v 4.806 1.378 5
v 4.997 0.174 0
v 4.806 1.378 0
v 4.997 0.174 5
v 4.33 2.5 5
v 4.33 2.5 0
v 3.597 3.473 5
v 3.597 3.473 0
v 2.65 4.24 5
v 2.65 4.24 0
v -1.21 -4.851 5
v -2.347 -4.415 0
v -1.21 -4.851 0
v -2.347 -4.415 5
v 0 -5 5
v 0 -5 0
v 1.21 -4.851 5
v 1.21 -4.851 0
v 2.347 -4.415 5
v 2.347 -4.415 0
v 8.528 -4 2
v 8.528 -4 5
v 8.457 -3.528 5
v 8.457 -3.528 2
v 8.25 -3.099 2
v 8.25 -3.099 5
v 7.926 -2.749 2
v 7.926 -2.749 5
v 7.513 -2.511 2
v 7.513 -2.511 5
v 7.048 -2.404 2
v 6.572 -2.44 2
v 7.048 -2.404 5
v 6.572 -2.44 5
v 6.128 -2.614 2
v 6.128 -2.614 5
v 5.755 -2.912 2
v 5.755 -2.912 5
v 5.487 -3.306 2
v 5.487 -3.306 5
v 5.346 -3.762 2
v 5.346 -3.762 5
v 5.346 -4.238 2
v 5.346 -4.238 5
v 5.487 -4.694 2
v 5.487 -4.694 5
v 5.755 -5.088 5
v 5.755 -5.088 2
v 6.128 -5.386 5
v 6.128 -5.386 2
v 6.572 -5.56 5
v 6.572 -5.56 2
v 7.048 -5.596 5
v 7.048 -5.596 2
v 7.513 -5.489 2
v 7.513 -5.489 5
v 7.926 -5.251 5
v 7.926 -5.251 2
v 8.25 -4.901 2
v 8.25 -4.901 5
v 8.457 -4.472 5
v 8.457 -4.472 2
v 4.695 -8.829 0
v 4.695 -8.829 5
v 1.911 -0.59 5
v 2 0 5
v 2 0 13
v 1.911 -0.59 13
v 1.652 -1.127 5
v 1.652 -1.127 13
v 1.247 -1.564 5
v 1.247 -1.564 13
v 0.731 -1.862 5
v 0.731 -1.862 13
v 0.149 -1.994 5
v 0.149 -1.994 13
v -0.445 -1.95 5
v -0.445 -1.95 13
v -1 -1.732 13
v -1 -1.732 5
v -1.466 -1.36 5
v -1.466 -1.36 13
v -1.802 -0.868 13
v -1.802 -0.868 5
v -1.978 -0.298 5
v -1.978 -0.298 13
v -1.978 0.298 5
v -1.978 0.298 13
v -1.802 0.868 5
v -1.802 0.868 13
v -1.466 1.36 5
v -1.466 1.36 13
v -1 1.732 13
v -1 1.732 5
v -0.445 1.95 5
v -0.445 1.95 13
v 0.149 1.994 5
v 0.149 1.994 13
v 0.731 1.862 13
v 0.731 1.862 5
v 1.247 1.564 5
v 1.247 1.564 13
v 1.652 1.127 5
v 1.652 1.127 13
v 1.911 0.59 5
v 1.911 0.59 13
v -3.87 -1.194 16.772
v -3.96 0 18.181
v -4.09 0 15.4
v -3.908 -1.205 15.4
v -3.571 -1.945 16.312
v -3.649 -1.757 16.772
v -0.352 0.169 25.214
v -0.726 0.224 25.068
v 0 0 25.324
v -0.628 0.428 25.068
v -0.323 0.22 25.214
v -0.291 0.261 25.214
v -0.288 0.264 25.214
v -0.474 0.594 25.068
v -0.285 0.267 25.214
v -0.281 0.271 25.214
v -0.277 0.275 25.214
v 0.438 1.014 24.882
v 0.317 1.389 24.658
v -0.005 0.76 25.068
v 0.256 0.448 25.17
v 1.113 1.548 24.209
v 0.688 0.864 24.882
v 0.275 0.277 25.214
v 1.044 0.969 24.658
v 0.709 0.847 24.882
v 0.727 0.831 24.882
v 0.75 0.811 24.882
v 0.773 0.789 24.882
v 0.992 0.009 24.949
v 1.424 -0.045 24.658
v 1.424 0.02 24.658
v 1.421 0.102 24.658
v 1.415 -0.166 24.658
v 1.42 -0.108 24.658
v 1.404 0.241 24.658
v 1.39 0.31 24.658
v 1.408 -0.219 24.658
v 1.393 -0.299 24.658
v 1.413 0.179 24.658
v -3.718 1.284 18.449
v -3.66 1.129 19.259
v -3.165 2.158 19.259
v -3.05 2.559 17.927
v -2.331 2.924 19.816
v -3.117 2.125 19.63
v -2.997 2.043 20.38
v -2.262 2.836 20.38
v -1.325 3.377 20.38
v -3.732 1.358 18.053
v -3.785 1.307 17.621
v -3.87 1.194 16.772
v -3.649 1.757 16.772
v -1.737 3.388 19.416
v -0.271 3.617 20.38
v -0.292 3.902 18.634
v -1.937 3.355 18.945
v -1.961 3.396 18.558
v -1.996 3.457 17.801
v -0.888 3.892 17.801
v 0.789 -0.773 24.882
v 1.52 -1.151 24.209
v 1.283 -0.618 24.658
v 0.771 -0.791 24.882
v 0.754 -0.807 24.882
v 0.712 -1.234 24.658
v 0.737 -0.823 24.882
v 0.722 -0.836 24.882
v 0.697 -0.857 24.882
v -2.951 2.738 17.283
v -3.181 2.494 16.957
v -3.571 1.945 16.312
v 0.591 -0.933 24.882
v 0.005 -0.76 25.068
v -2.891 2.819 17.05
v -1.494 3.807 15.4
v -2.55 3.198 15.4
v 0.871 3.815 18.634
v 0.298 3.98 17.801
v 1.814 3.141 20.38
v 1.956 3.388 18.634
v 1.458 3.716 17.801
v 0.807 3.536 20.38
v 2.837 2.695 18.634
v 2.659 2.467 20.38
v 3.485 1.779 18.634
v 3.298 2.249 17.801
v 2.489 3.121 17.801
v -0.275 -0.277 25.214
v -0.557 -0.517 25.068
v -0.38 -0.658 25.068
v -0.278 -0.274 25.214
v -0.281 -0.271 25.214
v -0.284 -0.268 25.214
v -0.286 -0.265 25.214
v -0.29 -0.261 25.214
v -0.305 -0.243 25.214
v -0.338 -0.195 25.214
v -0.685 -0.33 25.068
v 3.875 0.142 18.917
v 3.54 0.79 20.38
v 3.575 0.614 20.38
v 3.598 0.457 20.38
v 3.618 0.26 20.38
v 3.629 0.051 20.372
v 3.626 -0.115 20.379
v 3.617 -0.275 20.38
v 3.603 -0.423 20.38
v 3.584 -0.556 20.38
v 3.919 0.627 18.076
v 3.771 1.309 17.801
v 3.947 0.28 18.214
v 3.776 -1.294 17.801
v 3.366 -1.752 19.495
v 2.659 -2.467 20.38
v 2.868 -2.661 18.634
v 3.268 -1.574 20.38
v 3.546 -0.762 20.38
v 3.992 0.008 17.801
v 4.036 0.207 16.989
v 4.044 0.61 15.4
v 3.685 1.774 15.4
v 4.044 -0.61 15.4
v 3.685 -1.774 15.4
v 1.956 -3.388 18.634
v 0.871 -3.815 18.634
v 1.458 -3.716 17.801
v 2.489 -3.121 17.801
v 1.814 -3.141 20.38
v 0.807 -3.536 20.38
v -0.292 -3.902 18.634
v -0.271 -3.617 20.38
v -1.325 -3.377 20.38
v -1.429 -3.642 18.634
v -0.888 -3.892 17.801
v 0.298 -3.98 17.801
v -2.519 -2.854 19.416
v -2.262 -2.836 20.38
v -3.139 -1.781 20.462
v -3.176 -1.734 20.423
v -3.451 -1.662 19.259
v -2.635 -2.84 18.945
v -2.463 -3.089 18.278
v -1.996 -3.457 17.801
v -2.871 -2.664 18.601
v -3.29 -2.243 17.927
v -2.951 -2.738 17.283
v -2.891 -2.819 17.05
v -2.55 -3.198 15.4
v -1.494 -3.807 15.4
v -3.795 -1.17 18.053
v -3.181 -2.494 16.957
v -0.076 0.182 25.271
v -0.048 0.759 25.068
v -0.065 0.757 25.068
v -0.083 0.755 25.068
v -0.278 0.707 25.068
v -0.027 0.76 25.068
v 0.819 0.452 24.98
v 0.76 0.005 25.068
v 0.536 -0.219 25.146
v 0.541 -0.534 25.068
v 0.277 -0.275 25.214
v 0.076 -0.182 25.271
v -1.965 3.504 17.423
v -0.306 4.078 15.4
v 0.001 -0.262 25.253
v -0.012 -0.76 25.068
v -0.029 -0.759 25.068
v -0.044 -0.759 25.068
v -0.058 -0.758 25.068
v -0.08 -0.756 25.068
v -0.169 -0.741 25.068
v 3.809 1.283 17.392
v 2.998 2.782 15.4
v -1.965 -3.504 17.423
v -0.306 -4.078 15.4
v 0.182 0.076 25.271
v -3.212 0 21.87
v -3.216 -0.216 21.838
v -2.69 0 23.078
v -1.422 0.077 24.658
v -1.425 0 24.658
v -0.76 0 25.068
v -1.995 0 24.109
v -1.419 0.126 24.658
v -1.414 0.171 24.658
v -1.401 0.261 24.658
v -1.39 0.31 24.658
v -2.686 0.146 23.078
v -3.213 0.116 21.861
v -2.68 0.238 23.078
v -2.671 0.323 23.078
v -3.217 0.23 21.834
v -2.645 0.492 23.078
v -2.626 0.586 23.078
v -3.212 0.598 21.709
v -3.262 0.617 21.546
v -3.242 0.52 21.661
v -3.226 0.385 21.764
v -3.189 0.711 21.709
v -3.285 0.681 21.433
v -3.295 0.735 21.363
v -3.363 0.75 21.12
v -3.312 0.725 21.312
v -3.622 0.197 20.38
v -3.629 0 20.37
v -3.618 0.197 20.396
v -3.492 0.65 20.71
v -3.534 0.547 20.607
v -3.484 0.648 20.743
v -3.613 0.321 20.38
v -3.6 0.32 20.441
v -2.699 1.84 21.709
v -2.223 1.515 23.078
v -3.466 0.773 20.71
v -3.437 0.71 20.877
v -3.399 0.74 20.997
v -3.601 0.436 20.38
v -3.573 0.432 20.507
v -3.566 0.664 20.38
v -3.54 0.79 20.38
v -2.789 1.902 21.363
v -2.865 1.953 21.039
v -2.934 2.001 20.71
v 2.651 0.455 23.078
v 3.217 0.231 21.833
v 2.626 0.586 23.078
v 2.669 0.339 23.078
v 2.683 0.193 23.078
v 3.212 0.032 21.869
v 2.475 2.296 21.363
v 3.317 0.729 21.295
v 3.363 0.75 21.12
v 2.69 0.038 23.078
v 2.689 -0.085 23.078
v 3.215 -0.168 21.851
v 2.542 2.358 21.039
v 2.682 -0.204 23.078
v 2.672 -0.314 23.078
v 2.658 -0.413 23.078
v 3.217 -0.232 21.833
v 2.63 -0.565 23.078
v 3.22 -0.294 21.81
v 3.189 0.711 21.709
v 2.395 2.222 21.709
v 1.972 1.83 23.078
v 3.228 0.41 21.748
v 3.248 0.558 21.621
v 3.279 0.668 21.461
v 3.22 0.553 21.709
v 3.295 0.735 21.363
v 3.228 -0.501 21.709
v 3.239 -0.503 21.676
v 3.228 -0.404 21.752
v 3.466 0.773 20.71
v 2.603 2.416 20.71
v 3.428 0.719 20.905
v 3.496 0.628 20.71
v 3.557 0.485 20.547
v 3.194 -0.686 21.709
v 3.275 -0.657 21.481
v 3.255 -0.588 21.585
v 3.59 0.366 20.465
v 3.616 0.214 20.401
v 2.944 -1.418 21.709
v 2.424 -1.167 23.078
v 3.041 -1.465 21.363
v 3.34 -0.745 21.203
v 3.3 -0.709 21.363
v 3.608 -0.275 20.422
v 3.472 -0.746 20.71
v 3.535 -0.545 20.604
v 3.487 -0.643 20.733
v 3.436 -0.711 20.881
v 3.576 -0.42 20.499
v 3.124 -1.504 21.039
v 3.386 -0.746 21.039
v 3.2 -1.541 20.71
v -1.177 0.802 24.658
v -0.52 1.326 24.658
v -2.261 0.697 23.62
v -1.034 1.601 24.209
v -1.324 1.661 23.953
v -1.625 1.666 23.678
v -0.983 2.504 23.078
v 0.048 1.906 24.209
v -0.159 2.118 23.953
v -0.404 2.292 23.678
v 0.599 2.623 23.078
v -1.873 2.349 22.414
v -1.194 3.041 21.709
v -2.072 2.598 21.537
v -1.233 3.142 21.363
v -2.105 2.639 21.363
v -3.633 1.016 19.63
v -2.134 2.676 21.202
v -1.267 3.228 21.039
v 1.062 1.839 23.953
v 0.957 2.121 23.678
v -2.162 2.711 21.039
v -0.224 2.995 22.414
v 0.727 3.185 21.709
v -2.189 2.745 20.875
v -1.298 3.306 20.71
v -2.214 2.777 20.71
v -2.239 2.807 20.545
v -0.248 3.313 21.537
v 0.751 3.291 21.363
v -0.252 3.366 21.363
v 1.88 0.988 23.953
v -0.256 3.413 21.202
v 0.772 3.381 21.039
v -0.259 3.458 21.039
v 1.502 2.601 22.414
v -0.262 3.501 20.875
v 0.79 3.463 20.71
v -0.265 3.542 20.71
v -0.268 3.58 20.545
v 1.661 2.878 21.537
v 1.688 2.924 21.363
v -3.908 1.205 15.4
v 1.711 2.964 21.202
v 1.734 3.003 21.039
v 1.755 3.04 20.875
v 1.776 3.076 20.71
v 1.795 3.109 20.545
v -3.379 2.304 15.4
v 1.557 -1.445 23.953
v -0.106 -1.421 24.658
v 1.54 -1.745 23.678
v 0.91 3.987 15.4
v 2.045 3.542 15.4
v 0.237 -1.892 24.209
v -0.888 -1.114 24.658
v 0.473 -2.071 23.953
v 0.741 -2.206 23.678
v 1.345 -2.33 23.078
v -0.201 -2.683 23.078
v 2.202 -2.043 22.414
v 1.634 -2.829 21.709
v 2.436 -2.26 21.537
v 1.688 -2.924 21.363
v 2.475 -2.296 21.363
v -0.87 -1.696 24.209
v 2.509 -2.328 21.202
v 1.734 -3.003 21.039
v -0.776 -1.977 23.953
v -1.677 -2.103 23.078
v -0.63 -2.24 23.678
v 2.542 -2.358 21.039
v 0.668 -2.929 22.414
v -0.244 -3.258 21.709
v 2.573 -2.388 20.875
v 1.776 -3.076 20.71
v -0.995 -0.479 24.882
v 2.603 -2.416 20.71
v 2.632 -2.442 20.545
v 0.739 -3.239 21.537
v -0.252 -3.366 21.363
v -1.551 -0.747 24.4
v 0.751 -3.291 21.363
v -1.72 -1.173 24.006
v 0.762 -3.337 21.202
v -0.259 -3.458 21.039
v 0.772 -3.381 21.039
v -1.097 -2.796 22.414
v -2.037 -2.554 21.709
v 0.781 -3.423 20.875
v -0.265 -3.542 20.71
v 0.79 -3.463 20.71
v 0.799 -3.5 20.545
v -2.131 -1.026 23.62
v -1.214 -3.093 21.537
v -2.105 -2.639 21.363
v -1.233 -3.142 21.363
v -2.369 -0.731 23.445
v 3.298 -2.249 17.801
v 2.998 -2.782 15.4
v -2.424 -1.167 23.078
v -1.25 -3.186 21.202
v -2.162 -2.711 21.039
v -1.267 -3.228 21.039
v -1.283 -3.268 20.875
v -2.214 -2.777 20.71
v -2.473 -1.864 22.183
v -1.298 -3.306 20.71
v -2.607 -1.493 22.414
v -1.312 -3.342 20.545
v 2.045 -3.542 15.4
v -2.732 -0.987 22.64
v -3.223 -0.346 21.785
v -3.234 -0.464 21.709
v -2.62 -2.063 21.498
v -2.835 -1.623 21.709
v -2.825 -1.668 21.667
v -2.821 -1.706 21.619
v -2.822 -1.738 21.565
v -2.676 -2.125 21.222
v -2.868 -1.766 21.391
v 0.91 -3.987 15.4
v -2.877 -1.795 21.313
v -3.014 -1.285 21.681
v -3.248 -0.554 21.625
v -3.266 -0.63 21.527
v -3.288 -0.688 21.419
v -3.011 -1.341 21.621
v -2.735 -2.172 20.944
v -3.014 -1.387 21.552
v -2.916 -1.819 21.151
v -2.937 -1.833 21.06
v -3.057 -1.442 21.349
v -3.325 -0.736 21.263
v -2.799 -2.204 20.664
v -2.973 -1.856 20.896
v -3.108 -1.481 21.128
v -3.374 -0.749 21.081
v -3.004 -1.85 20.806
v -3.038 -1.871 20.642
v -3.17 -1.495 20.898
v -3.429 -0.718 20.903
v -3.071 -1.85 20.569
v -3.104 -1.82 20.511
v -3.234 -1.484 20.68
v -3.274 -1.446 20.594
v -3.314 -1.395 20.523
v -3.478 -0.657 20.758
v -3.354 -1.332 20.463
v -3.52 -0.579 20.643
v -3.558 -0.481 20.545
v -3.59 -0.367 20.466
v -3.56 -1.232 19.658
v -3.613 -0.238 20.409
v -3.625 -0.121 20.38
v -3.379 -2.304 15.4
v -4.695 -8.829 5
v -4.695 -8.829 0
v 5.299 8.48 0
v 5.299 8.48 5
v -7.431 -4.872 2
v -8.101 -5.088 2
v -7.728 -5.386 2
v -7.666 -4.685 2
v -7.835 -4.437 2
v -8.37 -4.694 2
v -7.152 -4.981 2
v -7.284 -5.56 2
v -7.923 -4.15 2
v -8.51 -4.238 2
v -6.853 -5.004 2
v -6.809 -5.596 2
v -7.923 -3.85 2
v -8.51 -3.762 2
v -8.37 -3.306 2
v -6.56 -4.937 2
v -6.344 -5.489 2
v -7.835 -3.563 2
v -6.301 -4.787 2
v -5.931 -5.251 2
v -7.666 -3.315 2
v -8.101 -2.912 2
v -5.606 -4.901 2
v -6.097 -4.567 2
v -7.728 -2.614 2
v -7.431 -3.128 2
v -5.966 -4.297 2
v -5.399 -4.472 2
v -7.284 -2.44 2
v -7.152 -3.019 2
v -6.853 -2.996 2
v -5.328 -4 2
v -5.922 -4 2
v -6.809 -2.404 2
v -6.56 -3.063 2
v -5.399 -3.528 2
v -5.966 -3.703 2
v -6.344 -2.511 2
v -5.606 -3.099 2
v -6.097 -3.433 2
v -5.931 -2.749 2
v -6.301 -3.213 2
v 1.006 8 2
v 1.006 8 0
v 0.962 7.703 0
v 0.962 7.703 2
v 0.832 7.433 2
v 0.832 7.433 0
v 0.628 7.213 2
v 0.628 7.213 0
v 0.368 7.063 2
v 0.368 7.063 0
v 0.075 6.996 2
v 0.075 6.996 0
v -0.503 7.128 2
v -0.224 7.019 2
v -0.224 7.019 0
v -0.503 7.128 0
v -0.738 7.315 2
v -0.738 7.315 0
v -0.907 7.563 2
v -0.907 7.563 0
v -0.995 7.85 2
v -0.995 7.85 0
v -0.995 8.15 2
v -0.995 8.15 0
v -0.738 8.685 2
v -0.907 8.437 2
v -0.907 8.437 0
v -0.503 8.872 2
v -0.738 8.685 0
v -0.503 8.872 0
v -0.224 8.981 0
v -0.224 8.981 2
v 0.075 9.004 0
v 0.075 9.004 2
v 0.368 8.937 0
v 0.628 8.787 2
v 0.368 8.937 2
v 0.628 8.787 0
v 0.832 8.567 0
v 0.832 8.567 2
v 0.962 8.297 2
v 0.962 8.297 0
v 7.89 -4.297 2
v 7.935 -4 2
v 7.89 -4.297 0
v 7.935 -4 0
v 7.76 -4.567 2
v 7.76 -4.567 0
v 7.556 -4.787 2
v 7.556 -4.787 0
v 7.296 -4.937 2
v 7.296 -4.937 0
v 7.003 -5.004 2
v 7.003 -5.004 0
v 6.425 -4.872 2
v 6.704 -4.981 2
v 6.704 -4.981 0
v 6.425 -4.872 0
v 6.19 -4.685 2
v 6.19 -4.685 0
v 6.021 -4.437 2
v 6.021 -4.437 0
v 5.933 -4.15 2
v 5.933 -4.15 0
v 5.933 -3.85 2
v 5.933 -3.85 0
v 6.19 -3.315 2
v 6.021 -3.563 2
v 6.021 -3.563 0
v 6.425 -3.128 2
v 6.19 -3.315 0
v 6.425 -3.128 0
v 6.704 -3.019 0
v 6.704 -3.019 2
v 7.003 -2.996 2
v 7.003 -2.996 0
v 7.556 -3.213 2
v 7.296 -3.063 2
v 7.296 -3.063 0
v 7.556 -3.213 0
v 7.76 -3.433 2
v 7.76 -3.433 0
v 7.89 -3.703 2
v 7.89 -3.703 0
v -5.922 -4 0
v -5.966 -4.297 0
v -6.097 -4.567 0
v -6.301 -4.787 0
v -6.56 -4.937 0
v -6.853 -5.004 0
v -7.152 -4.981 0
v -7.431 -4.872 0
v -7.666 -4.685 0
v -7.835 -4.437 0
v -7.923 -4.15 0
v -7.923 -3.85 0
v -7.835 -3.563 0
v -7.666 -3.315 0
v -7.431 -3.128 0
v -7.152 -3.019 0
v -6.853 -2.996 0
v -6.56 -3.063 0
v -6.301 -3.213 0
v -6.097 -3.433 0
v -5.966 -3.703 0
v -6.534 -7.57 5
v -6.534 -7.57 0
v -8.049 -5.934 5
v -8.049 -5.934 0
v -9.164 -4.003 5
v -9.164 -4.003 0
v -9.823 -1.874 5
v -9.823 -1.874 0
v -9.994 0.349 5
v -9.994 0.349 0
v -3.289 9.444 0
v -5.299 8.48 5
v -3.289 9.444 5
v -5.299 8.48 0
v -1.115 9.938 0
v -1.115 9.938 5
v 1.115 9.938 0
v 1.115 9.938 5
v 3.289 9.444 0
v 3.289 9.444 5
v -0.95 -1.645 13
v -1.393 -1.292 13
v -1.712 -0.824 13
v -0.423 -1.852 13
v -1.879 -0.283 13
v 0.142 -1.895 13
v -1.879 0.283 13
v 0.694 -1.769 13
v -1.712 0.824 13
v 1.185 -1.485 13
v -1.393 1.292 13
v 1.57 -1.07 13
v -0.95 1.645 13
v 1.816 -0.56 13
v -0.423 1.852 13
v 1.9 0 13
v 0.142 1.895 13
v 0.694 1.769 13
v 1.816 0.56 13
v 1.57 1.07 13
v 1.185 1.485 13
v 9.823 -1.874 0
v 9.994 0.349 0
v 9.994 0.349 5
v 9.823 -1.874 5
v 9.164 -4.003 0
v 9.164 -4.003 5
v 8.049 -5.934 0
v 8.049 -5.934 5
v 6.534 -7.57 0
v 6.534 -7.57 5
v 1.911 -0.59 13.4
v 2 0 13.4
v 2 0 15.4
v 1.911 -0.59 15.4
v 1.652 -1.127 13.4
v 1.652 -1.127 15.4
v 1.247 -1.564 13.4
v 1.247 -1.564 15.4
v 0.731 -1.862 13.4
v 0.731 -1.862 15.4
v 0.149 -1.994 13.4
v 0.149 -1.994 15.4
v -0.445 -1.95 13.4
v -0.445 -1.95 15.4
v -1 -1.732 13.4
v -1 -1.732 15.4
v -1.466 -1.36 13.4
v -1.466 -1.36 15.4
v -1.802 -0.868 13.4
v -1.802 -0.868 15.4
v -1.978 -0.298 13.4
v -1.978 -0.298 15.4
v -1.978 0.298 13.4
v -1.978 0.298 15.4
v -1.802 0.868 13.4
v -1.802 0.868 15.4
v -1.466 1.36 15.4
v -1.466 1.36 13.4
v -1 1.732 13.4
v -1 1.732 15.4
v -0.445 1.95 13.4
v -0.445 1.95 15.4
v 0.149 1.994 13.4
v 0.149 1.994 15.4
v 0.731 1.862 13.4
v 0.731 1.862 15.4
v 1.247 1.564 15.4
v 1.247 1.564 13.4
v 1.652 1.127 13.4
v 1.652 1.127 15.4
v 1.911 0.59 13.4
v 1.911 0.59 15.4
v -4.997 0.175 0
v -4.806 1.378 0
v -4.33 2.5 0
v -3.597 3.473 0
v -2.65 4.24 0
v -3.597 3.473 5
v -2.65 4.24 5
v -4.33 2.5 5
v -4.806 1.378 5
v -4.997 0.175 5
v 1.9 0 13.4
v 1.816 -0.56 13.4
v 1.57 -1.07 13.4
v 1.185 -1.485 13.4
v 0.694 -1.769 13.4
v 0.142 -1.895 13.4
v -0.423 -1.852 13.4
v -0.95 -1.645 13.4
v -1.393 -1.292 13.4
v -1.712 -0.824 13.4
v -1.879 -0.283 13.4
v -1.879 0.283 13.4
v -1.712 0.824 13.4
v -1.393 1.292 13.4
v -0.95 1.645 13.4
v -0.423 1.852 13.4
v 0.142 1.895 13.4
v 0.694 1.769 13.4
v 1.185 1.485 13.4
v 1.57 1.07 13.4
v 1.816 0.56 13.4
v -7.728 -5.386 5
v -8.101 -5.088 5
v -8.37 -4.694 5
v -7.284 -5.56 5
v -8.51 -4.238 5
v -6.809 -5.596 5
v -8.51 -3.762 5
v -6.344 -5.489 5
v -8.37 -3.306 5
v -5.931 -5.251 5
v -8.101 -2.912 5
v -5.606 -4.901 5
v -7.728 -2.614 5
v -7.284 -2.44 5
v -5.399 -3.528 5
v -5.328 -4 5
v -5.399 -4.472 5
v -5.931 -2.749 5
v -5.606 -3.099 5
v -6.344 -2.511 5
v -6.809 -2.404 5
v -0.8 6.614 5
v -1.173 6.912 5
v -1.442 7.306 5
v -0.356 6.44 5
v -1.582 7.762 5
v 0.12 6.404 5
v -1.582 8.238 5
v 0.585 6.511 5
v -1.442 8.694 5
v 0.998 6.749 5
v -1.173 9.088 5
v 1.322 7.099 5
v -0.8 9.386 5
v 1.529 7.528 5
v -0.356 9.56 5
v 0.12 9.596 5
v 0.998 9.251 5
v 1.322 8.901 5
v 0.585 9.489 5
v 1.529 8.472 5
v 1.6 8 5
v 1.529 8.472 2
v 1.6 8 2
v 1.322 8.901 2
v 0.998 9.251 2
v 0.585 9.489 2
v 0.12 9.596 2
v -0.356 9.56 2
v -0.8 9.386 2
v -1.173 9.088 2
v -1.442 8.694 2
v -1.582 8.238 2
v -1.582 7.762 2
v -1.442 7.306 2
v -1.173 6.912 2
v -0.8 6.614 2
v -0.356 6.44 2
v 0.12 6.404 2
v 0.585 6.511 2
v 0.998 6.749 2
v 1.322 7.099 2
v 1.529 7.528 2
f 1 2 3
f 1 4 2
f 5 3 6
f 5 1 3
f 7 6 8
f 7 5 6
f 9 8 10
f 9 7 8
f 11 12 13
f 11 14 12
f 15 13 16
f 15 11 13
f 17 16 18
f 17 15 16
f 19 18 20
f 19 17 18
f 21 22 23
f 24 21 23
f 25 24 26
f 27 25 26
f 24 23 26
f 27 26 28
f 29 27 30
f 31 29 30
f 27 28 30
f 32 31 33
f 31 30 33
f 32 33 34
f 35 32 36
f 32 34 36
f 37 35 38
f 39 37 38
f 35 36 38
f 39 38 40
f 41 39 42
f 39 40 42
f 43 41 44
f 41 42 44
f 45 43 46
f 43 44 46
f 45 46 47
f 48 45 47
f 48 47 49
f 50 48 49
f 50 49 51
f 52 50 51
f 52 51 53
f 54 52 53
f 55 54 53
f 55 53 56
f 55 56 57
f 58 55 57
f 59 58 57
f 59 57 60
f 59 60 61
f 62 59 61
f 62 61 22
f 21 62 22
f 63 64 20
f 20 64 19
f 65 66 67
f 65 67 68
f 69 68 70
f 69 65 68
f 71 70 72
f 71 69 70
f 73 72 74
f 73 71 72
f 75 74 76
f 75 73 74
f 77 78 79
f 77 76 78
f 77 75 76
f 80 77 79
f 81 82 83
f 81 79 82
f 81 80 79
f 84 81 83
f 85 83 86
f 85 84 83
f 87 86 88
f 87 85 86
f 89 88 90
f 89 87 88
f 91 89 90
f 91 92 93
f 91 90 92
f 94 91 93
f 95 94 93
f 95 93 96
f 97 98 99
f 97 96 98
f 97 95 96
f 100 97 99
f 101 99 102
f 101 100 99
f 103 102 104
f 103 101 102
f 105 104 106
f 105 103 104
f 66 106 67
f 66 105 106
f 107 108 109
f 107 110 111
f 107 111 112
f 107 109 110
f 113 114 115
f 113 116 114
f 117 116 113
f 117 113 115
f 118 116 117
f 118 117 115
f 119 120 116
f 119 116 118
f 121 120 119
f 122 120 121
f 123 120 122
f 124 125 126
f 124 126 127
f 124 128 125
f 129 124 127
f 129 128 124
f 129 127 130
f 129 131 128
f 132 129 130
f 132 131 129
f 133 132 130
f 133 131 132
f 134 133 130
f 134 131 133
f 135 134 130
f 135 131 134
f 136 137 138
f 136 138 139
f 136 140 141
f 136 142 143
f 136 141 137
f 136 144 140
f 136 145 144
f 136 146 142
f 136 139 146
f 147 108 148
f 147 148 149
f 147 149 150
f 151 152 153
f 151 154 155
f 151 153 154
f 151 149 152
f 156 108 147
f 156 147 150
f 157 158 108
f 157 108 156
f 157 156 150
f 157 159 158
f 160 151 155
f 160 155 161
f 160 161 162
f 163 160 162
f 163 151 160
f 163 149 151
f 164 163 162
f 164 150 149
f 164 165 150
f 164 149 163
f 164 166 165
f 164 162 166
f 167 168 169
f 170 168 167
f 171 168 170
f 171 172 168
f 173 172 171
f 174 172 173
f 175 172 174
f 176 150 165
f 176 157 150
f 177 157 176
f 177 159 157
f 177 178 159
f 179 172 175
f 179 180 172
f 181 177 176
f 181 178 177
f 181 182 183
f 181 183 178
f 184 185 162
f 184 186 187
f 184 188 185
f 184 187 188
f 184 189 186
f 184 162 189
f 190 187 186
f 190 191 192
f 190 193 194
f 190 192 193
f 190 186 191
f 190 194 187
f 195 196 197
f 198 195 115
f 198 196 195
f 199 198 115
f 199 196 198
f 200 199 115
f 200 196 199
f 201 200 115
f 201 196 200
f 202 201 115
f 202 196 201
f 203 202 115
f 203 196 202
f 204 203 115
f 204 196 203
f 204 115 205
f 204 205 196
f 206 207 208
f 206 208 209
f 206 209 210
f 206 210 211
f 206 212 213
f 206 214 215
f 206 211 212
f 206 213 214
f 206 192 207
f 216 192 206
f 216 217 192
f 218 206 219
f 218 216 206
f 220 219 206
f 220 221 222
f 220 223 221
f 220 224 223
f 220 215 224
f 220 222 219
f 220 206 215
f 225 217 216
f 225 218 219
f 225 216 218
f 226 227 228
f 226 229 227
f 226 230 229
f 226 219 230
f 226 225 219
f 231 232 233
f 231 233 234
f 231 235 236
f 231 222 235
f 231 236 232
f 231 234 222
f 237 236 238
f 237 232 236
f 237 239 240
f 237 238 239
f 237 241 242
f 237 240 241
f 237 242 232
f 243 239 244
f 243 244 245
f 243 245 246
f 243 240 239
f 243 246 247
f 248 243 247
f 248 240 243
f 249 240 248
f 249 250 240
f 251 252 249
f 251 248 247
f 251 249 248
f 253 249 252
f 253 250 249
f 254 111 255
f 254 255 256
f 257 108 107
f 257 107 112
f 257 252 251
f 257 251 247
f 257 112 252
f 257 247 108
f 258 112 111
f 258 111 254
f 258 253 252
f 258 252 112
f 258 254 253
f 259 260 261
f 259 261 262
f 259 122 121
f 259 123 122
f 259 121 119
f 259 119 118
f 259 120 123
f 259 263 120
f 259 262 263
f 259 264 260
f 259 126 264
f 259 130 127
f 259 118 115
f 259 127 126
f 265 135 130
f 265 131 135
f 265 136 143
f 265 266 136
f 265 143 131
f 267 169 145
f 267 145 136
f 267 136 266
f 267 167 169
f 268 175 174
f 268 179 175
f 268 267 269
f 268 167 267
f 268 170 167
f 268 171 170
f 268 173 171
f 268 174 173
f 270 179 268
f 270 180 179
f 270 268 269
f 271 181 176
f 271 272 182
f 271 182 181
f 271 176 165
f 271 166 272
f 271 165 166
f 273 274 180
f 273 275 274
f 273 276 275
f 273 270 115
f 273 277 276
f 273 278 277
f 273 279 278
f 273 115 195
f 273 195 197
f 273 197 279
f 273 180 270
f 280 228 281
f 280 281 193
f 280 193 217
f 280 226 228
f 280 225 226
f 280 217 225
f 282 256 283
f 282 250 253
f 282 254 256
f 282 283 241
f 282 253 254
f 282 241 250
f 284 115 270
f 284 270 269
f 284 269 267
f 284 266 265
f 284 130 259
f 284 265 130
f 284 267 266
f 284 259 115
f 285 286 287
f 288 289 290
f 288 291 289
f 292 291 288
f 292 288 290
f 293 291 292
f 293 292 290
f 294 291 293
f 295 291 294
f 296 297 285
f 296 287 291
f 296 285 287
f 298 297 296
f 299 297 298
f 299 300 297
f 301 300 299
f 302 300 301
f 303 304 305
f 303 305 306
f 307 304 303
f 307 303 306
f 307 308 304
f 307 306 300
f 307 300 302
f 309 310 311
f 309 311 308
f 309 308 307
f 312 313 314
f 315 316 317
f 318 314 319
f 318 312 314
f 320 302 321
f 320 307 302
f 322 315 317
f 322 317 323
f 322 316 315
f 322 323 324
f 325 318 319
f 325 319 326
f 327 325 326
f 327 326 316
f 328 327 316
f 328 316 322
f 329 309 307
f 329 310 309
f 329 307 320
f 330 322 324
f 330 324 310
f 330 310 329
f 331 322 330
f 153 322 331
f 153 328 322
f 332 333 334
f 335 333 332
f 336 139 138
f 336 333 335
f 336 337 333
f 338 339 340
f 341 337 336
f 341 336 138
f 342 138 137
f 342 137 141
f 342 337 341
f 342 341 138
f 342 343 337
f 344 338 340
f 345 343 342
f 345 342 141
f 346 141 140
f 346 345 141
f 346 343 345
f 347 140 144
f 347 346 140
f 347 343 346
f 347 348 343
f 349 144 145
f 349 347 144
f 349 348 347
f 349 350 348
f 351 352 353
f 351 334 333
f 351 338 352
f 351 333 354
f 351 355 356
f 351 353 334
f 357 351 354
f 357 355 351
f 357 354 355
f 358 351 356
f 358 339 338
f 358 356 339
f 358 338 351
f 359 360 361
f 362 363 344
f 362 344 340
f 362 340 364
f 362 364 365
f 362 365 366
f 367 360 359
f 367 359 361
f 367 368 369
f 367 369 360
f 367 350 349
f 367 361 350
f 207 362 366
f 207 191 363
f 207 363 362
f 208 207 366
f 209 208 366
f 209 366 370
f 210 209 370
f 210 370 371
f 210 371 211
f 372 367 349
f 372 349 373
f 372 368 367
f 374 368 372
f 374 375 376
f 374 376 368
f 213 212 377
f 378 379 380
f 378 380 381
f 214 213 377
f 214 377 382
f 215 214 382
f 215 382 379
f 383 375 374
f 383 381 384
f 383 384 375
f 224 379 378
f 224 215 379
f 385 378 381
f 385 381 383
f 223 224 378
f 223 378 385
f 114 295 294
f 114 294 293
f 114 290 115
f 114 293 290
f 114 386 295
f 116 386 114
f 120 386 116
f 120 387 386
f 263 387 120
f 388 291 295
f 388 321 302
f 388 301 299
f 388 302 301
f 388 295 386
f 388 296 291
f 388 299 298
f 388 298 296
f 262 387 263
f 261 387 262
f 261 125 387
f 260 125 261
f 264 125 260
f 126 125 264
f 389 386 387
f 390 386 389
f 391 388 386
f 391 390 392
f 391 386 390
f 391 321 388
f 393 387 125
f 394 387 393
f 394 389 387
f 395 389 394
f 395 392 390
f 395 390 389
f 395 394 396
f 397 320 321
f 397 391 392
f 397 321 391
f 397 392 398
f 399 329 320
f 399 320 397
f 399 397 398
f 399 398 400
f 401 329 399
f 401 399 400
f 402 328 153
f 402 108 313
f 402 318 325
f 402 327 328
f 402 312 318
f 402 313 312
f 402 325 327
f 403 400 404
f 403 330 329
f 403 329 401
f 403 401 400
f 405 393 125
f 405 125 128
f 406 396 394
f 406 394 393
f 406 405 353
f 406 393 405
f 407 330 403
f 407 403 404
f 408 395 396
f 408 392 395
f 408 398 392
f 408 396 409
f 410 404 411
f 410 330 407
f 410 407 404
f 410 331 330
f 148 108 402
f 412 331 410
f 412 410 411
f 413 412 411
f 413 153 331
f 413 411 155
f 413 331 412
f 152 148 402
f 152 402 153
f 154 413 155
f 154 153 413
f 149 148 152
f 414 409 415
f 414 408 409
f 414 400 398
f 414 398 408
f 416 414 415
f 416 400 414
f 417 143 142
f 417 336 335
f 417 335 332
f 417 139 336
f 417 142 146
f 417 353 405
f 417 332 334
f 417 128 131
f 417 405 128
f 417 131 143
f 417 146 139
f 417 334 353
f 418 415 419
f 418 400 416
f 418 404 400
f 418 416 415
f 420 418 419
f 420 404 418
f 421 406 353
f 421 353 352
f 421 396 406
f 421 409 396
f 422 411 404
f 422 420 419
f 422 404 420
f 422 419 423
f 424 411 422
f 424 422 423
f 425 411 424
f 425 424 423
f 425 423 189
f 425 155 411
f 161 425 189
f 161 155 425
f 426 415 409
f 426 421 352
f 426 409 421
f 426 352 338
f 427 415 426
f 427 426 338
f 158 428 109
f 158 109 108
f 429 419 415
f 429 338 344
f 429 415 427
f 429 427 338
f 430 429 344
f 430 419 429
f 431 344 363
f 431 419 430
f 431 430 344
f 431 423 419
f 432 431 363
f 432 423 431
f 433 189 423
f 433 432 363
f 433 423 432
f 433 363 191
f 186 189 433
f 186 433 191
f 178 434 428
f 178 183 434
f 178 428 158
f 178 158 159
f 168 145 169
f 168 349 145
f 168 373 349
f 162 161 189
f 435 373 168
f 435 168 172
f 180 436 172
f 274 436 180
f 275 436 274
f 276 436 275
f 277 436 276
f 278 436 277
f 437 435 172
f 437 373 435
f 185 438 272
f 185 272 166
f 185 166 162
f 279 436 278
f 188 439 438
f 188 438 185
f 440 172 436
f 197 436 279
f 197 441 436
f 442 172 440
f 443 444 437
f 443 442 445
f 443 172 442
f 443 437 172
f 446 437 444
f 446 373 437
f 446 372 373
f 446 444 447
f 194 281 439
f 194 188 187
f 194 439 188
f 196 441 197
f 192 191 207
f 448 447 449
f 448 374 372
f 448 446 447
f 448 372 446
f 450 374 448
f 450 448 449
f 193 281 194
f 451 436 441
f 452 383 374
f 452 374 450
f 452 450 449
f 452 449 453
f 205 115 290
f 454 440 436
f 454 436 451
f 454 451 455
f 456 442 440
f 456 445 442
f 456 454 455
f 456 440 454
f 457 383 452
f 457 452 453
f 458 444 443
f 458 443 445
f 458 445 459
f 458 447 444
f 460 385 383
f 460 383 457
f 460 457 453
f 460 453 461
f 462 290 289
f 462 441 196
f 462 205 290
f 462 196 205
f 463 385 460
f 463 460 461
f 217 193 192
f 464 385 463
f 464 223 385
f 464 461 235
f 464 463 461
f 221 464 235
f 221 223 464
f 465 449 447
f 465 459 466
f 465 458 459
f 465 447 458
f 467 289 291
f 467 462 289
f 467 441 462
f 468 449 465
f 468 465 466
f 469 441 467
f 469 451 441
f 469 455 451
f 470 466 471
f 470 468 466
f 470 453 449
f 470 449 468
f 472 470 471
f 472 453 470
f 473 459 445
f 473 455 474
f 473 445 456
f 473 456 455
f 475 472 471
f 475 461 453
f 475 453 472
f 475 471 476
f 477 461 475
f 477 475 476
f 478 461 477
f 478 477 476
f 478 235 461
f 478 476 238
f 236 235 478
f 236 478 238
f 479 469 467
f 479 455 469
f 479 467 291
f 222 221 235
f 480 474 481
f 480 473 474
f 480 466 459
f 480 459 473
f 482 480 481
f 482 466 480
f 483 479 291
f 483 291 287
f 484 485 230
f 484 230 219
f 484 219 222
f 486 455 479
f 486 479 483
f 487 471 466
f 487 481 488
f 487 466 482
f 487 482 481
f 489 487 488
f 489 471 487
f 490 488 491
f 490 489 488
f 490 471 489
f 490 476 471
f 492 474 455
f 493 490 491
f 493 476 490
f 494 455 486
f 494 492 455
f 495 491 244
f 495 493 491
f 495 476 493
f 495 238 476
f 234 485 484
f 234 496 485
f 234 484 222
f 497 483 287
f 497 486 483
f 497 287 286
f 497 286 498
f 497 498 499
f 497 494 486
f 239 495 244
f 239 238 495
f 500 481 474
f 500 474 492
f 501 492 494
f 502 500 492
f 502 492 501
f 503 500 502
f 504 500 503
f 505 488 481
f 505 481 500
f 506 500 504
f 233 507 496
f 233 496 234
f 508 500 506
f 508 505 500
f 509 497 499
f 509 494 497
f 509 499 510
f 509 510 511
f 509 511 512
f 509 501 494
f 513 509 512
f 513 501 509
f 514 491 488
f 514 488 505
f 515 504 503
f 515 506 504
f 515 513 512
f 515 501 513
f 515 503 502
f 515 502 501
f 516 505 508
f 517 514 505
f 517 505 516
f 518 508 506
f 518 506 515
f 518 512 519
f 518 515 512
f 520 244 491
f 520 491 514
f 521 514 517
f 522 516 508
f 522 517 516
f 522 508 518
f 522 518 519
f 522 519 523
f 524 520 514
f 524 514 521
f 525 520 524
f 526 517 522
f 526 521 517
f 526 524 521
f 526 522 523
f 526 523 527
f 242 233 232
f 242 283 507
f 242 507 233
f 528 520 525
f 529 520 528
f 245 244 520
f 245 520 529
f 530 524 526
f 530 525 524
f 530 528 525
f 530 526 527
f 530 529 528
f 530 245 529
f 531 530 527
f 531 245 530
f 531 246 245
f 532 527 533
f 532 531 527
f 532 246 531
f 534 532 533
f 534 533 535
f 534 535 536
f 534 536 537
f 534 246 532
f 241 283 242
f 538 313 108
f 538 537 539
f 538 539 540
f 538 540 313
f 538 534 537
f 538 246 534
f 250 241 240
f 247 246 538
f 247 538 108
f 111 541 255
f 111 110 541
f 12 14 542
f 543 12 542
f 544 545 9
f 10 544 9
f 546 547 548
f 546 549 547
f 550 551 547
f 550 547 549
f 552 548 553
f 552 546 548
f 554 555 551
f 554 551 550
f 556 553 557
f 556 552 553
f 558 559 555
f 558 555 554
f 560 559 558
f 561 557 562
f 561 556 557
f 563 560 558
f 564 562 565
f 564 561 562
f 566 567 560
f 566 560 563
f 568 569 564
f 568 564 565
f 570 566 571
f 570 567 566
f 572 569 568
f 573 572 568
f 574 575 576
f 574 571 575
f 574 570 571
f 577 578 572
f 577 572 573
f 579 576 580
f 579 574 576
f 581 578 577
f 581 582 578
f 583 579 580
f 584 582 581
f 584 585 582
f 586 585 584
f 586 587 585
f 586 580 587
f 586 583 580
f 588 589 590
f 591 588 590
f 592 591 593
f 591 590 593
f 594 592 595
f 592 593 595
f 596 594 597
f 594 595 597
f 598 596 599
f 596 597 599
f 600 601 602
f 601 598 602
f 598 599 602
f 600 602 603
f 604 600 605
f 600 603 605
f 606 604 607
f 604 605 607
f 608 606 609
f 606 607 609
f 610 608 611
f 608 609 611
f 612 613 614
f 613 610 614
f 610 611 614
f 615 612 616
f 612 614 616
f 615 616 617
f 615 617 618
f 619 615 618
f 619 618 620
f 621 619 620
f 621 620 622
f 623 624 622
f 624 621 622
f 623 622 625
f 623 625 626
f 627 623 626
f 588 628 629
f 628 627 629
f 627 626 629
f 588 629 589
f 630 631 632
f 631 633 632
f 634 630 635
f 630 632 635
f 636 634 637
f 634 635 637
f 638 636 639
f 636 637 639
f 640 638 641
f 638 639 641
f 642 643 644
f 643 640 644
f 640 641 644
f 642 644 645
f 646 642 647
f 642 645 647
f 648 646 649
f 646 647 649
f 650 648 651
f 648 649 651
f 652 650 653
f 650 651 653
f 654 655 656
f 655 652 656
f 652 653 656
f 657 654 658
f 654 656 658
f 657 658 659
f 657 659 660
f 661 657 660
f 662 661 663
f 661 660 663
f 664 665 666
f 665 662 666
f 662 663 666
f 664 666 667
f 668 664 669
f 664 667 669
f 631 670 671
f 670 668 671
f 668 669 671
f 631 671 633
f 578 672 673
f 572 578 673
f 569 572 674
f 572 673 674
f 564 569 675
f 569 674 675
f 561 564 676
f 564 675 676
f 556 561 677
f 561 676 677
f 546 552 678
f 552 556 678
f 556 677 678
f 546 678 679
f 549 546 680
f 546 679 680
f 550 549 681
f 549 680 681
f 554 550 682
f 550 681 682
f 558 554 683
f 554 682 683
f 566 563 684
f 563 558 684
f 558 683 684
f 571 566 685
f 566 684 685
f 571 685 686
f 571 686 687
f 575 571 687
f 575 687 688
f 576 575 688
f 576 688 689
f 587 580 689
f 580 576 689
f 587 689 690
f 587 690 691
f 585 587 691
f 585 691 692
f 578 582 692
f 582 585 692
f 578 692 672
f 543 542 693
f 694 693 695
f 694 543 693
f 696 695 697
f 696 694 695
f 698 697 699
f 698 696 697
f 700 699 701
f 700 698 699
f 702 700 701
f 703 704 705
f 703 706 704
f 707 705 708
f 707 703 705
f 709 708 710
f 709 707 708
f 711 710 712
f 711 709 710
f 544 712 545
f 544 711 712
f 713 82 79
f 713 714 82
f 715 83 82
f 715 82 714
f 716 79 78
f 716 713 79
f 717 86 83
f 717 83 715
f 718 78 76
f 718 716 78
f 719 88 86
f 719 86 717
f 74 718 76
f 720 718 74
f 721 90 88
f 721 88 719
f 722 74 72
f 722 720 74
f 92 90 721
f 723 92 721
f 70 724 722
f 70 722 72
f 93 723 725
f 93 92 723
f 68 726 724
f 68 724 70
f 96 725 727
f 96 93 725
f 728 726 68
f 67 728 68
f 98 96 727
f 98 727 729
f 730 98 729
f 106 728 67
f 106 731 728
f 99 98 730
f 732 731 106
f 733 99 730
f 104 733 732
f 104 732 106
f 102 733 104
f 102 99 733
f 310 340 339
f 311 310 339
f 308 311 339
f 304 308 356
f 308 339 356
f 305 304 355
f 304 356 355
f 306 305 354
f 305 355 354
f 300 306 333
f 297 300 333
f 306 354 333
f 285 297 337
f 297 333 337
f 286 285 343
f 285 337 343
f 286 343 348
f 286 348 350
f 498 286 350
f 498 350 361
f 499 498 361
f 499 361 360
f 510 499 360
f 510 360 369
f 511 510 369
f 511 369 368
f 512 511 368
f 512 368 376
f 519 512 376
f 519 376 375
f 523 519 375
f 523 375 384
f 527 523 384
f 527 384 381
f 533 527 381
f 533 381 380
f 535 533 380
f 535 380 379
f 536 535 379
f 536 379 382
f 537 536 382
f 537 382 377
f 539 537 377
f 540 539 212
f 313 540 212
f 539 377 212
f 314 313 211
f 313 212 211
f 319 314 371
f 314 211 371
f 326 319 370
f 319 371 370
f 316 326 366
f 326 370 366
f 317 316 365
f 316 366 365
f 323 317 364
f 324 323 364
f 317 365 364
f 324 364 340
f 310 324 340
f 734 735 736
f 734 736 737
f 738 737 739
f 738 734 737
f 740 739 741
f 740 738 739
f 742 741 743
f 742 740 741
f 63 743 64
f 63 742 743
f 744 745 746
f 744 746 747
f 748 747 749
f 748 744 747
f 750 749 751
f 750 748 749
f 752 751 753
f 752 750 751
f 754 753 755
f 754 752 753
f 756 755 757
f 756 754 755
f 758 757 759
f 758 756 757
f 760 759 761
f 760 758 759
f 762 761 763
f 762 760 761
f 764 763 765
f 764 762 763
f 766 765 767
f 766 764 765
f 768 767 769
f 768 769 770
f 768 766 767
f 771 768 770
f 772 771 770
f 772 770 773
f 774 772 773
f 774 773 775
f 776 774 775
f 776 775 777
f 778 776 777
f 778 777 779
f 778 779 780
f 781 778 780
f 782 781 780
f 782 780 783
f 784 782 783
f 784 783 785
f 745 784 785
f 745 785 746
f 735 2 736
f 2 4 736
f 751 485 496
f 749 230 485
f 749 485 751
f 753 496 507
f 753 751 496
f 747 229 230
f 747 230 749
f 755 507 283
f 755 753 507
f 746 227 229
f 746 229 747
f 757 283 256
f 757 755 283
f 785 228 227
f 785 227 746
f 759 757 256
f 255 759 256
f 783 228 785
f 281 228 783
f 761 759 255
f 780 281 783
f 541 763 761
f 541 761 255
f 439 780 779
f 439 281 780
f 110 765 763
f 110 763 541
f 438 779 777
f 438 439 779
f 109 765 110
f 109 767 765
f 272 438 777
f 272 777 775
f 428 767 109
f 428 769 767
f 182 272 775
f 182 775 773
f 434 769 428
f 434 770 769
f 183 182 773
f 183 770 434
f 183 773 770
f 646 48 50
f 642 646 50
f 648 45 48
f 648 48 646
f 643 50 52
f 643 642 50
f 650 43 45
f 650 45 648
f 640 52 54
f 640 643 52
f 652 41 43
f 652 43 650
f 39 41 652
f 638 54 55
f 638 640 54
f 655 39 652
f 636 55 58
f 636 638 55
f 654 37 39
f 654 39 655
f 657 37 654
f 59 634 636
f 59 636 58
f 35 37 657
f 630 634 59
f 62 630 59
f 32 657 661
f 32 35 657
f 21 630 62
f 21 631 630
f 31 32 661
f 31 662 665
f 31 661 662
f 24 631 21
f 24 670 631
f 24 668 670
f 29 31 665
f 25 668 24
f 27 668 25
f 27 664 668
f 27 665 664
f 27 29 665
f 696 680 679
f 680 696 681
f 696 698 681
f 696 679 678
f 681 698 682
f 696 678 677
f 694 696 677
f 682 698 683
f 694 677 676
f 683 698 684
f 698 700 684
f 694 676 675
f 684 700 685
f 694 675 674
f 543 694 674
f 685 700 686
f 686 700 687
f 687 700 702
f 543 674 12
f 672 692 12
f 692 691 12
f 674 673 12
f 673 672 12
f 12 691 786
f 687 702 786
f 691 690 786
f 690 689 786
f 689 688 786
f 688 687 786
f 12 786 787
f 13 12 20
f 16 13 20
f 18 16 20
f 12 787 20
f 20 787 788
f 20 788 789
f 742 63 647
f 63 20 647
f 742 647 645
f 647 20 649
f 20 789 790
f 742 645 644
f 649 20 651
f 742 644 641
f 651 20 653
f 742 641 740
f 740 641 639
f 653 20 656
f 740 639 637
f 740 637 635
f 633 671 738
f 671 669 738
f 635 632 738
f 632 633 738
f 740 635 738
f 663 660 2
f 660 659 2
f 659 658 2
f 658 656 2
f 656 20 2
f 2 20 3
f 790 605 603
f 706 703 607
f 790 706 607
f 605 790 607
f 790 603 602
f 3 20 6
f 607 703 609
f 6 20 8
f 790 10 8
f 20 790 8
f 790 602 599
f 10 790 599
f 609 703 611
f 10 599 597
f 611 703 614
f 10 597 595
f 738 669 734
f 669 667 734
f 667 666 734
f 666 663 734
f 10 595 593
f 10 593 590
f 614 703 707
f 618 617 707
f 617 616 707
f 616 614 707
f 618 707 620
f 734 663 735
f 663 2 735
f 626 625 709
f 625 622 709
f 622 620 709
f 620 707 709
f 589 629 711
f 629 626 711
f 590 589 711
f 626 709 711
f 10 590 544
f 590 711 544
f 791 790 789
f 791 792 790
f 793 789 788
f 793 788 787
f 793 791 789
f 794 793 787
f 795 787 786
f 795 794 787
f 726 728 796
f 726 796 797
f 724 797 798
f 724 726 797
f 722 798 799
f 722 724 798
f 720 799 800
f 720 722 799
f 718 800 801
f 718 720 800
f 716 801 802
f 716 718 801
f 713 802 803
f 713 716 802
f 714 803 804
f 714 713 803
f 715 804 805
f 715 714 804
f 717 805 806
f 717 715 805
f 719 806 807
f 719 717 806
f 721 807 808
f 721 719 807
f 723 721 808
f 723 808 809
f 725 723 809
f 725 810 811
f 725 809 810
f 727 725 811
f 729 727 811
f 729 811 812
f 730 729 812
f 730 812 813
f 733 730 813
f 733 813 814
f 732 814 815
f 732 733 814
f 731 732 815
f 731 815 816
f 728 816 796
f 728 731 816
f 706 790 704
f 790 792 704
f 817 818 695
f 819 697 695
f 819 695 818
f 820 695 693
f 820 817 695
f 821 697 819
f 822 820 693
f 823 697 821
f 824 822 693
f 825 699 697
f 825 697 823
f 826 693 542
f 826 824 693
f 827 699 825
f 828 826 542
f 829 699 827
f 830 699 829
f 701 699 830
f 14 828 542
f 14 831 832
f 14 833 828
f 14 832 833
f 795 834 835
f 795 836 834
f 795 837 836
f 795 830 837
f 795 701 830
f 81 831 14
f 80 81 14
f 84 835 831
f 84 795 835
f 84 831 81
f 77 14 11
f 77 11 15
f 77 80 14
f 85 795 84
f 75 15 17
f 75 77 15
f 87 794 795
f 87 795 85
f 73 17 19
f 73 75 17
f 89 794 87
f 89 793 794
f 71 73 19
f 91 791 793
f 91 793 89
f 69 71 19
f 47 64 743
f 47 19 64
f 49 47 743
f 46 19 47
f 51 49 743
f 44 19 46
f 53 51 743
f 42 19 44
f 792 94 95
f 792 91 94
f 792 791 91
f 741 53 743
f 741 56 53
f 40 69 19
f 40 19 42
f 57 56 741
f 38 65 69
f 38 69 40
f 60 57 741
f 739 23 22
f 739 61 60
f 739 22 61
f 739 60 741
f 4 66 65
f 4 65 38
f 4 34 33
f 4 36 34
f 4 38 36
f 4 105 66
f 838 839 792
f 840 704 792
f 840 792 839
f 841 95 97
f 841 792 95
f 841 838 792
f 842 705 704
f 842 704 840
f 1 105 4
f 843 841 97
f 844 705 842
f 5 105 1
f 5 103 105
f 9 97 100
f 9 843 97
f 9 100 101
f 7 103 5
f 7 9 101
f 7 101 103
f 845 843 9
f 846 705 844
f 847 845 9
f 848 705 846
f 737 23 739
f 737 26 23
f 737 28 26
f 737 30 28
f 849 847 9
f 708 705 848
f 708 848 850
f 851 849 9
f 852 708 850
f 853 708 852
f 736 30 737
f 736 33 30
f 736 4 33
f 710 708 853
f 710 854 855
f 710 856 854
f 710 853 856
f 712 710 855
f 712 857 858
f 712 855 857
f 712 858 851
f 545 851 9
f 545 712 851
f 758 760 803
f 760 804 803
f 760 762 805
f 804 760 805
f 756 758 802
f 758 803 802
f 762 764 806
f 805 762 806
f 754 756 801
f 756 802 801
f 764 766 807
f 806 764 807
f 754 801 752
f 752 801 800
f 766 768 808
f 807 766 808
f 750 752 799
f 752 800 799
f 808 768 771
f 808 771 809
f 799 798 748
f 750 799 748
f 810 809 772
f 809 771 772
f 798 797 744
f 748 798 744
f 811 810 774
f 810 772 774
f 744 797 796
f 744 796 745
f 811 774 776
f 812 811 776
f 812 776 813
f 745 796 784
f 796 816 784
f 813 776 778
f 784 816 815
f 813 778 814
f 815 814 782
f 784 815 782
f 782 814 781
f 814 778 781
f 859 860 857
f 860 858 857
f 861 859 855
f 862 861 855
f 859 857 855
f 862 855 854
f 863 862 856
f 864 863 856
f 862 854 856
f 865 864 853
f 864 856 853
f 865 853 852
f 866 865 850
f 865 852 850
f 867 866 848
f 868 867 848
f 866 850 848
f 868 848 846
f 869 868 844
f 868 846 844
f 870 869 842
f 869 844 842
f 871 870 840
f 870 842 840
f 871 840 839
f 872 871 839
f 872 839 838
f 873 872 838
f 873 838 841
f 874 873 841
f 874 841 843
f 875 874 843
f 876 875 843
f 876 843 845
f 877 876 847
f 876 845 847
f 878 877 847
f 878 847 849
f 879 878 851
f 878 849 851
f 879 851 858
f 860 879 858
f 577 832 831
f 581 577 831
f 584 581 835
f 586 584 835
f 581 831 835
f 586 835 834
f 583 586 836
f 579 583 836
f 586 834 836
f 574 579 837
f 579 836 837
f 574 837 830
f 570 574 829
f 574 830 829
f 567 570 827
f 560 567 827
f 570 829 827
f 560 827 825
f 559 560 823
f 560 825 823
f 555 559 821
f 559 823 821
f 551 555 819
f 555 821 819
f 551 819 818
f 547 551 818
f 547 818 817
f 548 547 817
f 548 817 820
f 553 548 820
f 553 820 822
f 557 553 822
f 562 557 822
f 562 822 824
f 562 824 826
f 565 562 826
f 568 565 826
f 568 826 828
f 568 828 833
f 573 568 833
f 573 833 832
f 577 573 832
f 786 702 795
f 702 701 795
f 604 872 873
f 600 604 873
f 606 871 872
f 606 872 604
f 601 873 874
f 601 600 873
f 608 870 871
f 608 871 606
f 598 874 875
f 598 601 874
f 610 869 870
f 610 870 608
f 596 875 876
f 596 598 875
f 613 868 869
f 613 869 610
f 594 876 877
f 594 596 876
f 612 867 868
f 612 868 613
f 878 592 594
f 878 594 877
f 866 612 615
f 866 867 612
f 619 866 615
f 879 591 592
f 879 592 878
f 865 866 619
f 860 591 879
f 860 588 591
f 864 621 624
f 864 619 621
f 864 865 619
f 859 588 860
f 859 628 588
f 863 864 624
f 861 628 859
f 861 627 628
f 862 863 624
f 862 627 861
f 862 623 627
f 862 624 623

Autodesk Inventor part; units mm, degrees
ref_plane "YZ Plane" through (0, 0, 0) normal (1, 0, 0) x (0, 1, 0)
ref_plane "XZ Plane" through (0, 0, 0) normal (0, 1, 0) x (-1, 0, 0)
ref_plane "XY Plane" through (0, 0, 0) normal (0, 0, 1) x (1, 0, 0)
sketch "Sketch1" plane through (0, 0, 0) normal (0, 0, 1) x (1, 0, 0)
  circle A0 centre (0, 0) radius 4
  circle A1 centre (0, 0) radius 10
  circle A2 centre (-6.9282, -4) radius 1.0065 projected
  circle A3 centre (6.9282, -4) radius 1.0065 projected
  circle A4 centre (0, 8) radius 1.0065 projected
  dimension "d0" = 8
  dimension "d1" = 20
extrude "Extrusion1" add sketch "Sketch1" along normal blind 5
sketch "Sketch2" plane through (0, 0, 5) normal (0, 0, 1) x (1, 0, 0)
  circle A0 centre (0, 0) radius 4 projected
  circle A1 centre (0, 0) radius 10 projected
  line L0 (3.9976, 0.1396) -> (13.5917, 0.4746) projected
  line L1 (7.2069, 11.5335) -> (2.1197, 3.3922) projected
  line L2 (3.9976, 0.1396) -> (6.6264, 0.2314)
  line L3 (9.9939, 0.349) -> (5.2992, 8.4805)
  line L4 (9.9939, 0.349) -> (3.9976, 0.1396)
  line L5 (2.1197, 3.3922) -> (5.2992, 8.4805)
  arc A2 (3.9976, 0.1396) -> (2.1197, 3.3922) centre (0, 0) ccw
  arc A3 (9.9939, 0.349) -> (5.2992, 8.4805) centre (0, 0) ccw
extrude "Extrusion2" cut sketch "Sketch2" against normal blind 5 contours A0 L1 L3 L0 | A1 L3
pattern_circular "Circular Pattern1" count 3 over 360 about axis through (0, 0, 0) along (0, 0, 1) of "Extrusion2"
sketch "Sketch3" plane through (0, 0, 5) normal (0, 0, 1) x (1, 0, 0)
  arc A0 (-9.9939, 0.349) -> (-4.6947, -8.8295) centre (0, 0) ccw projected
  circle A1 centre (0, 0) radius 5
  dimension "d9" = 10
extrude "Extrusion3" add sketch "Sketch3" against normal blind 5
sketch "Sketch4" plane through (0, 0, 5) normal (0, 0, 1) x (1, 0, 0)
  circle A0 centre (6.9282, -4) radius 1.0065 projected
  circle A1 centre (0, 8) radius 1.0065 projected
  circle A2 centre (-6.9282, -4) radius 1.0065 projected
  circle A3 centre (-6.9282, -4) radius 1.6
  circle A4 centre (6.9282, -4) radius 1.6
  circle A5 centre (0, 8) radius 1.6
  dimension "d12" = 3.2
  dimension "d13" = 3.2
  dimension "d14" = 3.2
extrude "Extrusion4" cut sketch "Sketch4" against normal blind 3
sketch "Sketch5" plane through (0, 0, 5) normal (0, 0, 1) x (1, 0, 0)
  arc A0 (-9.9939, 0.349) -> (-4.6947, -8.8295) centre (0, 0) ccw projected
  circle A1 centre (0, 0) radius 2
  dimension "d17" = 4
extrude "Extrusion5" add sketch "Sketch5" along normal blind 8
sketch "Sketch6" plane through (0, 0, 13) normal (0, 0, 1) x (1, 0, 0)
  circle A0 centre (0, 0) radius 2 projected
  circle A1 centre (0, 0) radius 1.9
  dimension "d20" = 3.8
extrude "Extrusion6" add sketch "Sketch6" along normal blind 0.4 contours A1
sketch "Sketch7" plane through (0, 0, 13.4) normal (0, 0, 1) x (1, 0, 0)
  circle A0 centre (0, 0) radius 1.9 projected
  circle A1 centre (0, 0) radius 2
  dimension "d23" = 4
extrude "Extrusion7" add sketch "Sketch7" along normal blind 10 contours A0 | A1
thread "Thread1" size "M4x0.7" class "6g" standard "ANSI Metric M Profile" full length
chamfer "Chamfer1" distance 0.4 angle 45 1 edges at (-2, 0, 23.4)
sketch "Sketch8" plane through (0, 0, 0) normal (0, 1, 0) x (-1, 0, 0)
  line L0 (-1.6, 23.4) -> (1.6, 23.4) projected
  line L1 (0, 25.3241) -> (0, 15.4)
  line L2 (0, 15.4) -> (4.0898, 15.4)
  spline S0 degree 3 poles (0, 25.3241) (0.1432, 25.2864) (2.524, 24.659) (3.9837, 20.08) (4.062, 16.6285) (4.0898, 15.4) knots 0 0 0 0 0.044151 0.734206 1.11559 1.11559 1.11559 1.11559
  point P0 (0, 0)
  point P1 (0.4244, 25.2023)
  point P2 (3.8385, 19.2055)
  dimension "d32" = 8
  dimension "d33" = 9.9241
revolve "Revolution1" add sketch "Sketch8" angle 360 about axis through (0, 0, 25.3241) along (0, 0, -1)
sketch "Sketch9" plane through (0, 0, 0) normal (1, 0, 0) x (0, 1, 0)
  line L0 (-4.0898, 15.4) -> (4.0898, 15.4) projected
  line L1 (0, 15.4) -> (0, 21.1198)
  circle A0 centre (0, 21.1198) radius 0.75
  point P0 (0, 0)
  dimension "d34" = 1.5
extrude "Extrusion8" cut sketch "Sketch9" against normal mid plane 20
equation "\"d13\" = d12"
equation "\"d14\" = d13"
properties part number "HK 2830 1100 prop adapter"
